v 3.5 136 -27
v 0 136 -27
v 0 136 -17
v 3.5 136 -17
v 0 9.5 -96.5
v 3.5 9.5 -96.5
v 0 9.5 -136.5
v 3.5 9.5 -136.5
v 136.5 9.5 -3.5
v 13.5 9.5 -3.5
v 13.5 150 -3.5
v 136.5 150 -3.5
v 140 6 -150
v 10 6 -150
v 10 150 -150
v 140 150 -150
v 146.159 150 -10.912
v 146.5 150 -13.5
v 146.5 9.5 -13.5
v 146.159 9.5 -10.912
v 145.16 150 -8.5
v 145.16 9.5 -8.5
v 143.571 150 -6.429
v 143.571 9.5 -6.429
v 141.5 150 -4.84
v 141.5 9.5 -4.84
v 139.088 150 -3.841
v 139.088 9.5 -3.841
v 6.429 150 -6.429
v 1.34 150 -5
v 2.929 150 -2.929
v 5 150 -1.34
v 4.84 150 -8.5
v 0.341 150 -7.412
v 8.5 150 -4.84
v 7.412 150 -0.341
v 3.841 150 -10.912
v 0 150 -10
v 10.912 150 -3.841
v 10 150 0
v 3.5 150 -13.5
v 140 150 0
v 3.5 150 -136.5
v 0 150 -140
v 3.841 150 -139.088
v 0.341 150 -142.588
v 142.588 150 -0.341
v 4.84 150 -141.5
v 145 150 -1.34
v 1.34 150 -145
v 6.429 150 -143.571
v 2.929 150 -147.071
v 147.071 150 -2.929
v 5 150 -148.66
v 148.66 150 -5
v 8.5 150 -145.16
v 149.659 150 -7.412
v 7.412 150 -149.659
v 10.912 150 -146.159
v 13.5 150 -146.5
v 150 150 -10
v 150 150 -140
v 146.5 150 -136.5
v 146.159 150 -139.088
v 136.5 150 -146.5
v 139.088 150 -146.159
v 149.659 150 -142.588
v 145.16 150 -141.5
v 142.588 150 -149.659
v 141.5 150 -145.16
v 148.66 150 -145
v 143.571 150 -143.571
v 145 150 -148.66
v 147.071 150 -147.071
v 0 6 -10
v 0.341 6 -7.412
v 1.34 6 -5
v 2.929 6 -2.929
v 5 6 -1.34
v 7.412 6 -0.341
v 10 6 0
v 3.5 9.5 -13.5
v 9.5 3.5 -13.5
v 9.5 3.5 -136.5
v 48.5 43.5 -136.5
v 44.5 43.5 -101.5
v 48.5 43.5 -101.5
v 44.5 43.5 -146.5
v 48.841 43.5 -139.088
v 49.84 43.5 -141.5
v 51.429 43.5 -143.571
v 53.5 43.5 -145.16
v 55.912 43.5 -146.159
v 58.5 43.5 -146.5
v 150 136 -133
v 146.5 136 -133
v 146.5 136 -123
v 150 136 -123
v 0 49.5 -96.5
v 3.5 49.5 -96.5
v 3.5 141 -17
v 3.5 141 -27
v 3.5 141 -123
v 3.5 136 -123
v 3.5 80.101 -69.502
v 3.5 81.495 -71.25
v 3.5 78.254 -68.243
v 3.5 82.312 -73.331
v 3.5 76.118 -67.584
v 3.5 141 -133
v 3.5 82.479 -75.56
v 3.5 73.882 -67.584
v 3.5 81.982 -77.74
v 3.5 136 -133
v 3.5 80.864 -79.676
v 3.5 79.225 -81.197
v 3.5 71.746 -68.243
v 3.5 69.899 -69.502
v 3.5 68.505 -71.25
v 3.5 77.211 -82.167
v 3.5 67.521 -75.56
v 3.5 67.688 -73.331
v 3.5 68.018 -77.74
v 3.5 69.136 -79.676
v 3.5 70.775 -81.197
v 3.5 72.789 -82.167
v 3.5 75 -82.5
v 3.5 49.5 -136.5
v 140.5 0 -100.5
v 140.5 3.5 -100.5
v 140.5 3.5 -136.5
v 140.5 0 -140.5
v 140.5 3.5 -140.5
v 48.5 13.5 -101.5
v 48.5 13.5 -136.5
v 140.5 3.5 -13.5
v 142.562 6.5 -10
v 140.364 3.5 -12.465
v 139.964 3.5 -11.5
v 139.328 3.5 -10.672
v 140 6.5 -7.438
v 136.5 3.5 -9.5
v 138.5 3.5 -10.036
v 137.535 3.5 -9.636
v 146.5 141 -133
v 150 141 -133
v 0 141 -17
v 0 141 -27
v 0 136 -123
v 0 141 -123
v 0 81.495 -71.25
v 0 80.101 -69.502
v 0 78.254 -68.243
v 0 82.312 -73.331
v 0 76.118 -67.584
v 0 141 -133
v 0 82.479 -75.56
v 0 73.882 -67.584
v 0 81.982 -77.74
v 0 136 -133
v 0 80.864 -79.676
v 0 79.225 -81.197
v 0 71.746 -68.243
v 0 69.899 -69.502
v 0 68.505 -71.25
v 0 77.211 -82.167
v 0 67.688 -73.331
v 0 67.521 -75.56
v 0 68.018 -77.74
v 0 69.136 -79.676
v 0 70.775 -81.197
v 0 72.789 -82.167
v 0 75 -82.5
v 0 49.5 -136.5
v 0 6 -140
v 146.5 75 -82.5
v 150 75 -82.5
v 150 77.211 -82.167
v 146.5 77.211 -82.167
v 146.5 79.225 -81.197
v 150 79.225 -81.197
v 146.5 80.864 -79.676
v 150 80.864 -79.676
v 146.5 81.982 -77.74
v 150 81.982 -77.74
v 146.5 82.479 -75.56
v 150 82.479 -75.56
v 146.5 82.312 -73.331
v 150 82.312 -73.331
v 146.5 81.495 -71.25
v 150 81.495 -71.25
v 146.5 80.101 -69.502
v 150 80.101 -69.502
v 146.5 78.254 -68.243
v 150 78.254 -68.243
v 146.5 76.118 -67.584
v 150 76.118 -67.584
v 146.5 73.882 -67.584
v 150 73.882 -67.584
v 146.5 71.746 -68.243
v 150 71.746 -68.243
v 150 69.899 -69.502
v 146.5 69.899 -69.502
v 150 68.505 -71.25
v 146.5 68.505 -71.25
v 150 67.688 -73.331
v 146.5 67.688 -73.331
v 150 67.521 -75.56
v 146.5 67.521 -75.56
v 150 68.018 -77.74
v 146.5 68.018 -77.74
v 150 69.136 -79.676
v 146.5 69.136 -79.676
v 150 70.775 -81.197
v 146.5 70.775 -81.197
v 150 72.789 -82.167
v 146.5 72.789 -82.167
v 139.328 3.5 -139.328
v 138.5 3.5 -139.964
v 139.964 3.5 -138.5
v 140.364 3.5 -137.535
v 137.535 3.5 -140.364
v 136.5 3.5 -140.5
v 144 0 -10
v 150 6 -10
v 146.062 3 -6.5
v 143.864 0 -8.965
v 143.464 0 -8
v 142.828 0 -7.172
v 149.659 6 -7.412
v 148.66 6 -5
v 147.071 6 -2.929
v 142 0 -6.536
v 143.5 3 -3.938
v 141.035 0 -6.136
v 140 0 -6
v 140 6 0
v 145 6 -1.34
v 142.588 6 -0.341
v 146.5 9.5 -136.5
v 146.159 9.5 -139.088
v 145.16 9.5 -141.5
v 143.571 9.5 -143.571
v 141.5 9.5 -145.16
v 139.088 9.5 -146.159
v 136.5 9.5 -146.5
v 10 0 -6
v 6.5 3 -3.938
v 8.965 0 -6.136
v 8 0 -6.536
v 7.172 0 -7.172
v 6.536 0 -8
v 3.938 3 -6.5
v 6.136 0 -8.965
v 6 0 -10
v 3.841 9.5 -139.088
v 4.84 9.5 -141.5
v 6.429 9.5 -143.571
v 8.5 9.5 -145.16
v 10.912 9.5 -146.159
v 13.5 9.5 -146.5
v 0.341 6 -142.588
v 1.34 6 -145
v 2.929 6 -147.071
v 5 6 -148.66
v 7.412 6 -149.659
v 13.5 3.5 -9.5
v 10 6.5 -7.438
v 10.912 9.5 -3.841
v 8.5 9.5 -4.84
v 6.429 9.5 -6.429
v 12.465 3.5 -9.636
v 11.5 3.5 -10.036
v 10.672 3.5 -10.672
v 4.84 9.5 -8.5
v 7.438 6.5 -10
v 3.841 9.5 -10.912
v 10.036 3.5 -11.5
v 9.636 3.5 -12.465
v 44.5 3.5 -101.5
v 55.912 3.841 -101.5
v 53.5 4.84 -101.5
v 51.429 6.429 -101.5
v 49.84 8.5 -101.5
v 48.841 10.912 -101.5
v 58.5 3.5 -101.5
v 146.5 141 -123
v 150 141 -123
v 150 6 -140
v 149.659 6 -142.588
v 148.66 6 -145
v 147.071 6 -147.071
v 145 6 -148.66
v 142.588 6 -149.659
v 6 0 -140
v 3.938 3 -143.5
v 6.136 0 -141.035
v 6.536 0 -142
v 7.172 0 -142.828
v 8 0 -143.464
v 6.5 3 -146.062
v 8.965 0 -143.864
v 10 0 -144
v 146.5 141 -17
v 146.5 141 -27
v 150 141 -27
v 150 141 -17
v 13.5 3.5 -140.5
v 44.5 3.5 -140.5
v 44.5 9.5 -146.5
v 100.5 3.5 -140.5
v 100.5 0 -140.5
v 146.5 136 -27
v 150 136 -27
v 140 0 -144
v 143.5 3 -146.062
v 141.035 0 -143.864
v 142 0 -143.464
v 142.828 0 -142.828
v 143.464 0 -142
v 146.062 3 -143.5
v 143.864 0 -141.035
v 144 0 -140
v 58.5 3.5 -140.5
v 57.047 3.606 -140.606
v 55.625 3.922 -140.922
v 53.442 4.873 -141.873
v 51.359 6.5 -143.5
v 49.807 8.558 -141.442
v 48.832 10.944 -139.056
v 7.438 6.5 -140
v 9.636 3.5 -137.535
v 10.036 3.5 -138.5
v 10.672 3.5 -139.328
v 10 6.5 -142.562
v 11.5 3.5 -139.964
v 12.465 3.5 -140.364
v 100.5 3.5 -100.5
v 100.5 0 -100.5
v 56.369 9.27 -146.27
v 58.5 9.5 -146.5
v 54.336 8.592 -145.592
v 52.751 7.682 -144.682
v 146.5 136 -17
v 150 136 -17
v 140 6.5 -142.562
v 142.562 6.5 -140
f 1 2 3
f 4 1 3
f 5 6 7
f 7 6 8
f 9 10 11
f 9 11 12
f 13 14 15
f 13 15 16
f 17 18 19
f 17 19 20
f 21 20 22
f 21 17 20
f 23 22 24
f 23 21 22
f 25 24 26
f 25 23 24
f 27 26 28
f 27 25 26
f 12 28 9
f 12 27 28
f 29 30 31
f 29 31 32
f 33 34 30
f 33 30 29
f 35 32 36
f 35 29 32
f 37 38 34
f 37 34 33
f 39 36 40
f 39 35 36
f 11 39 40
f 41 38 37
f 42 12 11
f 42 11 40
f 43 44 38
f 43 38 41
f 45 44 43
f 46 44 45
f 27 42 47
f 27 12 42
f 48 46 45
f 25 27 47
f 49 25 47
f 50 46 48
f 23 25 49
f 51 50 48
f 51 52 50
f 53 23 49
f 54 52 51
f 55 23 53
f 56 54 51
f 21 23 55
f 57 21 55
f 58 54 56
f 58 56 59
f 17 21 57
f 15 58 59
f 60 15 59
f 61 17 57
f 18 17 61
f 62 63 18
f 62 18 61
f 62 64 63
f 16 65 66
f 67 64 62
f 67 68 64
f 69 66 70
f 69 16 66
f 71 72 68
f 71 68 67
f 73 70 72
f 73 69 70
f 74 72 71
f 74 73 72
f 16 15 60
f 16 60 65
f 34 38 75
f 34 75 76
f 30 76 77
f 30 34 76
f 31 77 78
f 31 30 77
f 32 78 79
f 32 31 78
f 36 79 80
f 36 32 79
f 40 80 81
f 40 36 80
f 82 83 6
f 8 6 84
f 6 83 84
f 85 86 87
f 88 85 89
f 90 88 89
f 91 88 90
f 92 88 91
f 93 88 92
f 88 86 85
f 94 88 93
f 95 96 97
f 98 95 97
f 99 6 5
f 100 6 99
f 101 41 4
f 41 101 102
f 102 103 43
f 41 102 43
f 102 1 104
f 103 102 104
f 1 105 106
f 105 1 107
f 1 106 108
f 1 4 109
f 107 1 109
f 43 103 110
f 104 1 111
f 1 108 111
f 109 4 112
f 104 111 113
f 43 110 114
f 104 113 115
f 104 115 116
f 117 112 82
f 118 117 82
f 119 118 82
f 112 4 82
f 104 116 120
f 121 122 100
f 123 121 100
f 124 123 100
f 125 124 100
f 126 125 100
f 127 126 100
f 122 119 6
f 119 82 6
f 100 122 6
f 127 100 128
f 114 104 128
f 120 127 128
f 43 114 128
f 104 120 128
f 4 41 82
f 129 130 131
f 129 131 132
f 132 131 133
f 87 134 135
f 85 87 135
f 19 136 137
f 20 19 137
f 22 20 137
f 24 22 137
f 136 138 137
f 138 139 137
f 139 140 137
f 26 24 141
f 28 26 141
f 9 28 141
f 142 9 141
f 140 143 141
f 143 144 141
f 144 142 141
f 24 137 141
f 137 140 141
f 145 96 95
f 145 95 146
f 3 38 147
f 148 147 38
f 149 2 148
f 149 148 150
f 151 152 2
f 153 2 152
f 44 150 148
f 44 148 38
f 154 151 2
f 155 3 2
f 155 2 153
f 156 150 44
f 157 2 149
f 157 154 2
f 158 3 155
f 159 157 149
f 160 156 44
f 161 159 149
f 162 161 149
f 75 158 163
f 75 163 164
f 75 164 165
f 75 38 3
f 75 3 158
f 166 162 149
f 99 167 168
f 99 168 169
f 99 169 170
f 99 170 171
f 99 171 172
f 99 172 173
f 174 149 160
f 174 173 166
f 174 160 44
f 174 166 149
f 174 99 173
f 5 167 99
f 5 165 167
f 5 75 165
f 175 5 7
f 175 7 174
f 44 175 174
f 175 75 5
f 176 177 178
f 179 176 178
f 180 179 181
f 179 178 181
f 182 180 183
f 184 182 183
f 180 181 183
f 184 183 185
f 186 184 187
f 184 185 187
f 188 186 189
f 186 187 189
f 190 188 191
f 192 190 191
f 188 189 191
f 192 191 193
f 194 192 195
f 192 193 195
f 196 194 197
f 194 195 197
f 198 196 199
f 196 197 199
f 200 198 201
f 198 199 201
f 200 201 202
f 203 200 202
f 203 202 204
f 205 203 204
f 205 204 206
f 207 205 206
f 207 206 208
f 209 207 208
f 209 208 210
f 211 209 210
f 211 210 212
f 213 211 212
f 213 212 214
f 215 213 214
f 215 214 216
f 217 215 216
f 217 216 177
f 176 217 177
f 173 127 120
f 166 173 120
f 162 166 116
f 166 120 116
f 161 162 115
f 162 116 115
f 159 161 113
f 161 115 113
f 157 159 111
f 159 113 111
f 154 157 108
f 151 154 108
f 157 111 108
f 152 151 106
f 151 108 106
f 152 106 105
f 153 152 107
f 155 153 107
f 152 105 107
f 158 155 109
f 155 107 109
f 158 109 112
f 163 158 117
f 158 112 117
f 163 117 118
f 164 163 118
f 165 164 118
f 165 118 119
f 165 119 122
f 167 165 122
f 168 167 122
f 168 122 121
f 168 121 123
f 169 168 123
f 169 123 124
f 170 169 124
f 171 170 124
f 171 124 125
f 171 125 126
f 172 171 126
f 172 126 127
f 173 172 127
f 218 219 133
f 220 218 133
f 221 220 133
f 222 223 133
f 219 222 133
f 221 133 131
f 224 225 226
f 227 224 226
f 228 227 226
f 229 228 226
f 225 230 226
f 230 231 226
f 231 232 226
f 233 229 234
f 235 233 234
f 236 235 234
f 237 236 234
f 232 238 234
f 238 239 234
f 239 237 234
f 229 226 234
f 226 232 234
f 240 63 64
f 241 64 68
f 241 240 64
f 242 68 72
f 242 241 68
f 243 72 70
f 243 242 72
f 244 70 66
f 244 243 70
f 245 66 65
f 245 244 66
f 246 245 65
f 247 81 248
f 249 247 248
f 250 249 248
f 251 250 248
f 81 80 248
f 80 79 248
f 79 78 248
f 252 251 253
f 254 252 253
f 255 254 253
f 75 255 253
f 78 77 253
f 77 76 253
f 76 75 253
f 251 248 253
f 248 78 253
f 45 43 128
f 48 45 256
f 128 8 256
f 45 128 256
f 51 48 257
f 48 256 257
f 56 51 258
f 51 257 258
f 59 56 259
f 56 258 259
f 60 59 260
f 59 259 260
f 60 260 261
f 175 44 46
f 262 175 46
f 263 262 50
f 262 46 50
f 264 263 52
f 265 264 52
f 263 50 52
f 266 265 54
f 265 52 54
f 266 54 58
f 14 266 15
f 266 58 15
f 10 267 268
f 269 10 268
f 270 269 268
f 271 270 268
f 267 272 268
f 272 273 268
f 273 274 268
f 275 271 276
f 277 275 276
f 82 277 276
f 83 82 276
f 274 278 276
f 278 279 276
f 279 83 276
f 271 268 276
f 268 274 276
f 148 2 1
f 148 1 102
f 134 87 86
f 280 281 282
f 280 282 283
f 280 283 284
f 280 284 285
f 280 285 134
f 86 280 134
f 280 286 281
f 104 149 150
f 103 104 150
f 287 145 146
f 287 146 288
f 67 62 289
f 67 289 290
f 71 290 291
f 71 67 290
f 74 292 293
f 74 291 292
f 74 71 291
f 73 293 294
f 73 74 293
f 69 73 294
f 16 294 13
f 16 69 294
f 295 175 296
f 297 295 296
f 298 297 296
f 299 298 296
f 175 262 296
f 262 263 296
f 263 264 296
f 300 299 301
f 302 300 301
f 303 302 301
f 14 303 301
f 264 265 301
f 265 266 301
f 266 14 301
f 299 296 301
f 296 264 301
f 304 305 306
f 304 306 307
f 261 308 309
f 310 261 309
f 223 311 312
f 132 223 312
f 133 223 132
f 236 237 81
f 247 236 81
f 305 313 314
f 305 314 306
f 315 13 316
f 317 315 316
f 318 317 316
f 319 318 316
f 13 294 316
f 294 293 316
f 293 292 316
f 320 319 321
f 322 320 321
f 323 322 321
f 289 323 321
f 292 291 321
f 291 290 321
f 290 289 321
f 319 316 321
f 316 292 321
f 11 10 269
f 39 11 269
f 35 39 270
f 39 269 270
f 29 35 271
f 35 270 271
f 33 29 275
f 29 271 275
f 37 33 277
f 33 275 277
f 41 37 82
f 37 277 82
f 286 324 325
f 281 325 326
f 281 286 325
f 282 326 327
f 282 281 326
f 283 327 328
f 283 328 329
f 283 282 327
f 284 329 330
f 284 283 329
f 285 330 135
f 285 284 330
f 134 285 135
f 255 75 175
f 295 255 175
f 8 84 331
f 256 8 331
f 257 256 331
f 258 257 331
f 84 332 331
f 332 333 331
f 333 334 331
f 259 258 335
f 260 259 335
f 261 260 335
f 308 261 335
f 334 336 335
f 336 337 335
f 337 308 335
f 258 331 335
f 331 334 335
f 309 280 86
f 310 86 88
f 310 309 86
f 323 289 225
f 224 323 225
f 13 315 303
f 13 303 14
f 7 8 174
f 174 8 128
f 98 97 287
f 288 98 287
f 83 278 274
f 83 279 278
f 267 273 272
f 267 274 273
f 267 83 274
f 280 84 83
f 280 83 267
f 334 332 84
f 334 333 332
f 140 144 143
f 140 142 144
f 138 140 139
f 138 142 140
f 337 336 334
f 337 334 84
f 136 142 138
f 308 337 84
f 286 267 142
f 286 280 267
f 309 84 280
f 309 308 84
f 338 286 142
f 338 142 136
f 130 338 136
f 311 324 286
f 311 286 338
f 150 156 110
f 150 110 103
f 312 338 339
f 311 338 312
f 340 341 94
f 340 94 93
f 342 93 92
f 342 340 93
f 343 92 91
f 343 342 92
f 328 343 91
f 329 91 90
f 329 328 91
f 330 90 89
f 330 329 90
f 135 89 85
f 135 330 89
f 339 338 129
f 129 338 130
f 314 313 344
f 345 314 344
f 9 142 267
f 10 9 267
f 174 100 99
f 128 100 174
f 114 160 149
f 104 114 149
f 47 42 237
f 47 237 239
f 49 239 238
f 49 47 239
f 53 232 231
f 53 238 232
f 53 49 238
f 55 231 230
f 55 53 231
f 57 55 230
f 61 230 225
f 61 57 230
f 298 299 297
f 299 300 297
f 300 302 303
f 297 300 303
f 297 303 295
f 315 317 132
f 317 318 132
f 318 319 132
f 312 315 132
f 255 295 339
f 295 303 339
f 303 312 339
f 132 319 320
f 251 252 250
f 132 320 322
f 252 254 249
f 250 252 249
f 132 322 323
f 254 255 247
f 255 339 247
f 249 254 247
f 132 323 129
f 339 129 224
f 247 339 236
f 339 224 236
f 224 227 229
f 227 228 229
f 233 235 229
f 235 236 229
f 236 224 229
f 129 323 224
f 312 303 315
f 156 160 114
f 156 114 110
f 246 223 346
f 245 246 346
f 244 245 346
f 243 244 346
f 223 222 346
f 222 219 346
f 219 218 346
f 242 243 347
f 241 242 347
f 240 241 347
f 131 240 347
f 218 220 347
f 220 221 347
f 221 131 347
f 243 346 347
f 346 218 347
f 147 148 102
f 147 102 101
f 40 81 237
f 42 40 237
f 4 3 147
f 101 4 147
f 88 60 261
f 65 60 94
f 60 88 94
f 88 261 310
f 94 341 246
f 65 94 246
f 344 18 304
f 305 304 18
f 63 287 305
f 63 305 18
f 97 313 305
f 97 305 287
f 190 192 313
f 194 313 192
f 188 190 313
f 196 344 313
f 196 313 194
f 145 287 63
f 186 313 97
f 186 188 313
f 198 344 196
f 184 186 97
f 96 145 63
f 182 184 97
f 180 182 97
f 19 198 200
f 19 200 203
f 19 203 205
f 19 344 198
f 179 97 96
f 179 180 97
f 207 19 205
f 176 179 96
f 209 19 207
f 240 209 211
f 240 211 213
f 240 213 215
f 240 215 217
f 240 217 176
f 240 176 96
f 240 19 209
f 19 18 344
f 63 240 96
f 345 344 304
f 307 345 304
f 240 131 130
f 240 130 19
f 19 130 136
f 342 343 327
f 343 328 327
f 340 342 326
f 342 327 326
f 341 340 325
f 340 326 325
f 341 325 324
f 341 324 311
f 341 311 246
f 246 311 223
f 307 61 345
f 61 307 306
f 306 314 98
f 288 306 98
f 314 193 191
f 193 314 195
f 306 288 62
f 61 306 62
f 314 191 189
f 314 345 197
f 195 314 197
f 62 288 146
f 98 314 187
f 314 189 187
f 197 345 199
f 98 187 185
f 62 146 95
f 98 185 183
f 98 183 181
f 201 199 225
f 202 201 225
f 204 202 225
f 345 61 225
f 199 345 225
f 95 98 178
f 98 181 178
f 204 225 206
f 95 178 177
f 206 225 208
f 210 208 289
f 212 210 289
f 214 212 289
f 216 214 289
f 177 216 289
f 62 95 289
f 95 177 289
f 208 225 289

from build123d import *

# Parameters (mm, degrees)
SKETCH1_W           = 150
SKETCH1_H           = 150
BOSS_EXTRUDE1_DEPTH = 150
SHELL1_T            = -3.5
FILLET2_R           = 10
FILLET3_R           = 10
SKETCH2_R           = 7.5
CUT_EXTRUDE1_DEPTH  = 200
CHAMFER1_SIZE       = 6
CHAMFER2_SIZE       = 6
SKETCH3_W           = 10
SKETCH3_H           = 5
CUT_EXTRUDE2_DEPTH  = 234
SKETCH4_W           = 10
SKETCH4_H           = 5
CUT_EXTRUDE3_DEPTH  = 234
SKETCH5_W           = 40
SKETCH5_H           = 40
CUT_EXTRUDE4_DEPTH  = 10
SKETCH6_W           = 4
SKETCH6_H           = 45
BOSS_EXTRUDE2_DEPTH = 40
FILLET4_R           = 10
SKETCH7_W           = 40
SKETCH7_H           = 40
CUT_EXTRUDE5_DEPTH  = 40


with BuildPart() as part:
    # Sketch1 → Boss-Extrude1 (new body)
    with BuildSketch(Plane(origin=(0, 0, 0), x_dir=(1, 0, 0), z_dir=(0, 1, 0))):
        with Locations((75, 75)):
            Rectangle(SKETCH1_W, SKETCH1_H)
    extrude(amount=BOSS_EXTRUDE1_DEPTH)

    # Shell1
    shell1_openings = [part.faces().sort_by_distance(p)[0] for p in [
        (75, 150, -75),
    ]]
    offset(amount=SHELL1_T, openings=shell1_openings, kind=Kind.INTERSECTION)

    # Fillet2
    fillet2_edges = [part.edges().sort_by_distance(p)[0] for p in [
        (150, 75, -150),
        (150, 75, 0),
        (0, 75, 0),
    ]]
    fillet(fillet2_edges, radius=FILLET2_R)

    # Fillet3
    fillet3_edges = [part.edges().sort_by_distance(p)[0] for p in [
        (3.5, 76.75, -146.5),
        (3.5, 76.75, -3.5),
        (146.5, 76.75, -3.5),
        (146.5, 76.75, -146.5),
        (0, 75, -150),
    ]]
    fillet(fillet3_edges, radius=FILLET3_R)

    # Sketch2 → Cut-Extrude1 (cut)
    with BuildSketch(Plane(origin=(150, 0, 0), x_dir=(0, 0, -1), z_dir=(1, 0, 0))):
        with Locations((75, 75)):
            Circle(SKETCH2_R)
    extrude(amount=-CUT_EXTRUDE1_DEPTH, mode=Mode.SUBTRACT)

    # Chamfer1
    chamfer1_edges = [part.edges().sort_by_distance(p)[0] for p in [
        (75, 0, -150),
        (150, 0, -75),
        (75, 0, 0),
        (2.928932188, 0, -2.928932188),
        (147.071067812, 0, -2.928932188),
        (147.071067812, 0, -147.071067812),
        (0, 0, -75),
        (2.928932188, 0, -147.071067812),
    ]]
    chamfer(chamfer1_edges, length=CHAMFER1_SIZE)

    # Chamfer2
    chamfer2_edges = [part.edges().sort_by_distance(p)[0] for p in [
        (3.5, 3.5, -75),
        (75, 3.5, -3.5),
        (146.5, 3.5, -75),
        (75, 3.5, -146.5),
        (6.428932188, 3.5, -143.571067812),
        (143.571067812, 3.5, -143.571067812),
        (143.571067812, 3.5, -6.428932188),
        (6.428932188, 3.5, -6.428932188),
    ]]
    chamfer(chamfer2_edges, length=CHAMFER2_SIZE)

    # Sketch3 → Cut-Extrude2 (cut)
    with BuildSketch(Plane.ZY):
        with Locations((-128, 138.5)):
            Rectangle(SKETCH3_W, SKETCH3_H)
    extrude(amount=-CUT_EXTRUDE2_DEPTH, mode=Mode.SUBTRACT)

    # Sketch4 → Cut-Extrude3 (cut)
    with BuildSketch(Plane.ZY):
        with Locations((-22, 138.5)):
            Rectangle(SKETCH4_W, SKETCH4_H)
    extrude(amount=-CUT_EXTRUDE3_DEPTH, mode=Mode.SUBTRACT)

    # Sketch5 → Cut-Extrude4 (cut)
    with BuildSketch(Plane(origin=(0, 3.5, 0), x_dir=(1, 0, 0), z_dir=(0, 1, 0))):
        with Locations((120.5, 120.5)):
            Rectangle(SKETCH5_W, SKETCH5_H)
    extrude(amount=-CUT_EXTRUDE4_DEPTH, mode=Mode.SUBTRACT)

    # Sketch6 → Boss-Extrude2 (add)
    with BuildSketch(Plane(origin=(0, 3.5, 0), x_dir=(1, 0, 0), z_dir=(0, 1, 0))):
        with Locations((46.5, 124)):
            Rectangle(SKETCH6_W, SKETCH6_H)
    extrude(amount=BOSS_EXTRUDE2_DEPTH)

    # Fillet4
    # the kernel refuses this fillet: 10 mm, written as the material it adds along each edge
    with BuildSketch(Plane(origin=(48.5, -15.5, -146.5), x_dir=(1, 0, 0), z_dir=(0, 1, 0))) as fillet4_piece_1_section:
        with BuildLine():
            CenterArc((FILLET4_R, -FILLET4_R), FILLET4_R, 90, 90)
            Line((0, -FILLET4_R), (0, 0))
            Line((0, 0), (FILLET4_R, 0))
        make_face()
    fillet4_piece_1 = extrude(amount=59, mode=Mode.PRIVATE)
    fillet4_piece_1 = split(fillet4_piece_1, bisect_by=Plane(origin=(50.679406429, 12.771443898, -156.771443898), z_dir=(0, 0.7071067811865476, 0.7071067811865476)), keep=Keep.TOP, mode=Mode.PRIVATE)
    fillet4_piece_1 = split(fillet4_piece_1, bisect_by=Plane(origin=(50.679406429, 0, -144.176636194), z_dir=(0, 1, 0)), keep=Keep.TOP, mode=Mode.PRIVATE)
    add(fillet4_piece_1)
    with BuildSketch(Plane(origin=(48.5, 3.5, -101.5), x_dir=(1, 0, 0), z_dir=(0, 0, -1))) as fillet4_piece_2_section:
        with BuildLine():
            CenterArc((FILLET4_R, -FILLET4_R), FILLET4_R, 90, 90)
            Line((0, -FILLET4_R), (0, 0))
            Line((0, 0), (FILLET4_R, 0))
        make_face()
    fillet4_piece_2 = extrude(amount=64, mode=Mode.PRIVATE)
    fillet4_piece_2 = split(fillet4_piece_2, bisect_by=Plane(origin=(50.685995649, 5.81247532, -146.5), z_dir=(0, 0, 1)), keep=Keep.TOP, mode=Mode.PRIVATE)
    add(fillet4_piece_2)

    # Sketch7 → Cut-Extrude5 (cut)
    with BuildSketch(Plane(origin=(3.5, 0, 0), x_dir=(0, 0, -1), z_dir=(1, 0, 0))):
        with Locations((116.5, 29.5)):
            Rectangle(SKETCH7_W, SKETCH7_H)
    extrude(amount=-CUT_EXTRUDE5_DEPTH, mode=Mode.SUBTRACT)


solid = part.part
